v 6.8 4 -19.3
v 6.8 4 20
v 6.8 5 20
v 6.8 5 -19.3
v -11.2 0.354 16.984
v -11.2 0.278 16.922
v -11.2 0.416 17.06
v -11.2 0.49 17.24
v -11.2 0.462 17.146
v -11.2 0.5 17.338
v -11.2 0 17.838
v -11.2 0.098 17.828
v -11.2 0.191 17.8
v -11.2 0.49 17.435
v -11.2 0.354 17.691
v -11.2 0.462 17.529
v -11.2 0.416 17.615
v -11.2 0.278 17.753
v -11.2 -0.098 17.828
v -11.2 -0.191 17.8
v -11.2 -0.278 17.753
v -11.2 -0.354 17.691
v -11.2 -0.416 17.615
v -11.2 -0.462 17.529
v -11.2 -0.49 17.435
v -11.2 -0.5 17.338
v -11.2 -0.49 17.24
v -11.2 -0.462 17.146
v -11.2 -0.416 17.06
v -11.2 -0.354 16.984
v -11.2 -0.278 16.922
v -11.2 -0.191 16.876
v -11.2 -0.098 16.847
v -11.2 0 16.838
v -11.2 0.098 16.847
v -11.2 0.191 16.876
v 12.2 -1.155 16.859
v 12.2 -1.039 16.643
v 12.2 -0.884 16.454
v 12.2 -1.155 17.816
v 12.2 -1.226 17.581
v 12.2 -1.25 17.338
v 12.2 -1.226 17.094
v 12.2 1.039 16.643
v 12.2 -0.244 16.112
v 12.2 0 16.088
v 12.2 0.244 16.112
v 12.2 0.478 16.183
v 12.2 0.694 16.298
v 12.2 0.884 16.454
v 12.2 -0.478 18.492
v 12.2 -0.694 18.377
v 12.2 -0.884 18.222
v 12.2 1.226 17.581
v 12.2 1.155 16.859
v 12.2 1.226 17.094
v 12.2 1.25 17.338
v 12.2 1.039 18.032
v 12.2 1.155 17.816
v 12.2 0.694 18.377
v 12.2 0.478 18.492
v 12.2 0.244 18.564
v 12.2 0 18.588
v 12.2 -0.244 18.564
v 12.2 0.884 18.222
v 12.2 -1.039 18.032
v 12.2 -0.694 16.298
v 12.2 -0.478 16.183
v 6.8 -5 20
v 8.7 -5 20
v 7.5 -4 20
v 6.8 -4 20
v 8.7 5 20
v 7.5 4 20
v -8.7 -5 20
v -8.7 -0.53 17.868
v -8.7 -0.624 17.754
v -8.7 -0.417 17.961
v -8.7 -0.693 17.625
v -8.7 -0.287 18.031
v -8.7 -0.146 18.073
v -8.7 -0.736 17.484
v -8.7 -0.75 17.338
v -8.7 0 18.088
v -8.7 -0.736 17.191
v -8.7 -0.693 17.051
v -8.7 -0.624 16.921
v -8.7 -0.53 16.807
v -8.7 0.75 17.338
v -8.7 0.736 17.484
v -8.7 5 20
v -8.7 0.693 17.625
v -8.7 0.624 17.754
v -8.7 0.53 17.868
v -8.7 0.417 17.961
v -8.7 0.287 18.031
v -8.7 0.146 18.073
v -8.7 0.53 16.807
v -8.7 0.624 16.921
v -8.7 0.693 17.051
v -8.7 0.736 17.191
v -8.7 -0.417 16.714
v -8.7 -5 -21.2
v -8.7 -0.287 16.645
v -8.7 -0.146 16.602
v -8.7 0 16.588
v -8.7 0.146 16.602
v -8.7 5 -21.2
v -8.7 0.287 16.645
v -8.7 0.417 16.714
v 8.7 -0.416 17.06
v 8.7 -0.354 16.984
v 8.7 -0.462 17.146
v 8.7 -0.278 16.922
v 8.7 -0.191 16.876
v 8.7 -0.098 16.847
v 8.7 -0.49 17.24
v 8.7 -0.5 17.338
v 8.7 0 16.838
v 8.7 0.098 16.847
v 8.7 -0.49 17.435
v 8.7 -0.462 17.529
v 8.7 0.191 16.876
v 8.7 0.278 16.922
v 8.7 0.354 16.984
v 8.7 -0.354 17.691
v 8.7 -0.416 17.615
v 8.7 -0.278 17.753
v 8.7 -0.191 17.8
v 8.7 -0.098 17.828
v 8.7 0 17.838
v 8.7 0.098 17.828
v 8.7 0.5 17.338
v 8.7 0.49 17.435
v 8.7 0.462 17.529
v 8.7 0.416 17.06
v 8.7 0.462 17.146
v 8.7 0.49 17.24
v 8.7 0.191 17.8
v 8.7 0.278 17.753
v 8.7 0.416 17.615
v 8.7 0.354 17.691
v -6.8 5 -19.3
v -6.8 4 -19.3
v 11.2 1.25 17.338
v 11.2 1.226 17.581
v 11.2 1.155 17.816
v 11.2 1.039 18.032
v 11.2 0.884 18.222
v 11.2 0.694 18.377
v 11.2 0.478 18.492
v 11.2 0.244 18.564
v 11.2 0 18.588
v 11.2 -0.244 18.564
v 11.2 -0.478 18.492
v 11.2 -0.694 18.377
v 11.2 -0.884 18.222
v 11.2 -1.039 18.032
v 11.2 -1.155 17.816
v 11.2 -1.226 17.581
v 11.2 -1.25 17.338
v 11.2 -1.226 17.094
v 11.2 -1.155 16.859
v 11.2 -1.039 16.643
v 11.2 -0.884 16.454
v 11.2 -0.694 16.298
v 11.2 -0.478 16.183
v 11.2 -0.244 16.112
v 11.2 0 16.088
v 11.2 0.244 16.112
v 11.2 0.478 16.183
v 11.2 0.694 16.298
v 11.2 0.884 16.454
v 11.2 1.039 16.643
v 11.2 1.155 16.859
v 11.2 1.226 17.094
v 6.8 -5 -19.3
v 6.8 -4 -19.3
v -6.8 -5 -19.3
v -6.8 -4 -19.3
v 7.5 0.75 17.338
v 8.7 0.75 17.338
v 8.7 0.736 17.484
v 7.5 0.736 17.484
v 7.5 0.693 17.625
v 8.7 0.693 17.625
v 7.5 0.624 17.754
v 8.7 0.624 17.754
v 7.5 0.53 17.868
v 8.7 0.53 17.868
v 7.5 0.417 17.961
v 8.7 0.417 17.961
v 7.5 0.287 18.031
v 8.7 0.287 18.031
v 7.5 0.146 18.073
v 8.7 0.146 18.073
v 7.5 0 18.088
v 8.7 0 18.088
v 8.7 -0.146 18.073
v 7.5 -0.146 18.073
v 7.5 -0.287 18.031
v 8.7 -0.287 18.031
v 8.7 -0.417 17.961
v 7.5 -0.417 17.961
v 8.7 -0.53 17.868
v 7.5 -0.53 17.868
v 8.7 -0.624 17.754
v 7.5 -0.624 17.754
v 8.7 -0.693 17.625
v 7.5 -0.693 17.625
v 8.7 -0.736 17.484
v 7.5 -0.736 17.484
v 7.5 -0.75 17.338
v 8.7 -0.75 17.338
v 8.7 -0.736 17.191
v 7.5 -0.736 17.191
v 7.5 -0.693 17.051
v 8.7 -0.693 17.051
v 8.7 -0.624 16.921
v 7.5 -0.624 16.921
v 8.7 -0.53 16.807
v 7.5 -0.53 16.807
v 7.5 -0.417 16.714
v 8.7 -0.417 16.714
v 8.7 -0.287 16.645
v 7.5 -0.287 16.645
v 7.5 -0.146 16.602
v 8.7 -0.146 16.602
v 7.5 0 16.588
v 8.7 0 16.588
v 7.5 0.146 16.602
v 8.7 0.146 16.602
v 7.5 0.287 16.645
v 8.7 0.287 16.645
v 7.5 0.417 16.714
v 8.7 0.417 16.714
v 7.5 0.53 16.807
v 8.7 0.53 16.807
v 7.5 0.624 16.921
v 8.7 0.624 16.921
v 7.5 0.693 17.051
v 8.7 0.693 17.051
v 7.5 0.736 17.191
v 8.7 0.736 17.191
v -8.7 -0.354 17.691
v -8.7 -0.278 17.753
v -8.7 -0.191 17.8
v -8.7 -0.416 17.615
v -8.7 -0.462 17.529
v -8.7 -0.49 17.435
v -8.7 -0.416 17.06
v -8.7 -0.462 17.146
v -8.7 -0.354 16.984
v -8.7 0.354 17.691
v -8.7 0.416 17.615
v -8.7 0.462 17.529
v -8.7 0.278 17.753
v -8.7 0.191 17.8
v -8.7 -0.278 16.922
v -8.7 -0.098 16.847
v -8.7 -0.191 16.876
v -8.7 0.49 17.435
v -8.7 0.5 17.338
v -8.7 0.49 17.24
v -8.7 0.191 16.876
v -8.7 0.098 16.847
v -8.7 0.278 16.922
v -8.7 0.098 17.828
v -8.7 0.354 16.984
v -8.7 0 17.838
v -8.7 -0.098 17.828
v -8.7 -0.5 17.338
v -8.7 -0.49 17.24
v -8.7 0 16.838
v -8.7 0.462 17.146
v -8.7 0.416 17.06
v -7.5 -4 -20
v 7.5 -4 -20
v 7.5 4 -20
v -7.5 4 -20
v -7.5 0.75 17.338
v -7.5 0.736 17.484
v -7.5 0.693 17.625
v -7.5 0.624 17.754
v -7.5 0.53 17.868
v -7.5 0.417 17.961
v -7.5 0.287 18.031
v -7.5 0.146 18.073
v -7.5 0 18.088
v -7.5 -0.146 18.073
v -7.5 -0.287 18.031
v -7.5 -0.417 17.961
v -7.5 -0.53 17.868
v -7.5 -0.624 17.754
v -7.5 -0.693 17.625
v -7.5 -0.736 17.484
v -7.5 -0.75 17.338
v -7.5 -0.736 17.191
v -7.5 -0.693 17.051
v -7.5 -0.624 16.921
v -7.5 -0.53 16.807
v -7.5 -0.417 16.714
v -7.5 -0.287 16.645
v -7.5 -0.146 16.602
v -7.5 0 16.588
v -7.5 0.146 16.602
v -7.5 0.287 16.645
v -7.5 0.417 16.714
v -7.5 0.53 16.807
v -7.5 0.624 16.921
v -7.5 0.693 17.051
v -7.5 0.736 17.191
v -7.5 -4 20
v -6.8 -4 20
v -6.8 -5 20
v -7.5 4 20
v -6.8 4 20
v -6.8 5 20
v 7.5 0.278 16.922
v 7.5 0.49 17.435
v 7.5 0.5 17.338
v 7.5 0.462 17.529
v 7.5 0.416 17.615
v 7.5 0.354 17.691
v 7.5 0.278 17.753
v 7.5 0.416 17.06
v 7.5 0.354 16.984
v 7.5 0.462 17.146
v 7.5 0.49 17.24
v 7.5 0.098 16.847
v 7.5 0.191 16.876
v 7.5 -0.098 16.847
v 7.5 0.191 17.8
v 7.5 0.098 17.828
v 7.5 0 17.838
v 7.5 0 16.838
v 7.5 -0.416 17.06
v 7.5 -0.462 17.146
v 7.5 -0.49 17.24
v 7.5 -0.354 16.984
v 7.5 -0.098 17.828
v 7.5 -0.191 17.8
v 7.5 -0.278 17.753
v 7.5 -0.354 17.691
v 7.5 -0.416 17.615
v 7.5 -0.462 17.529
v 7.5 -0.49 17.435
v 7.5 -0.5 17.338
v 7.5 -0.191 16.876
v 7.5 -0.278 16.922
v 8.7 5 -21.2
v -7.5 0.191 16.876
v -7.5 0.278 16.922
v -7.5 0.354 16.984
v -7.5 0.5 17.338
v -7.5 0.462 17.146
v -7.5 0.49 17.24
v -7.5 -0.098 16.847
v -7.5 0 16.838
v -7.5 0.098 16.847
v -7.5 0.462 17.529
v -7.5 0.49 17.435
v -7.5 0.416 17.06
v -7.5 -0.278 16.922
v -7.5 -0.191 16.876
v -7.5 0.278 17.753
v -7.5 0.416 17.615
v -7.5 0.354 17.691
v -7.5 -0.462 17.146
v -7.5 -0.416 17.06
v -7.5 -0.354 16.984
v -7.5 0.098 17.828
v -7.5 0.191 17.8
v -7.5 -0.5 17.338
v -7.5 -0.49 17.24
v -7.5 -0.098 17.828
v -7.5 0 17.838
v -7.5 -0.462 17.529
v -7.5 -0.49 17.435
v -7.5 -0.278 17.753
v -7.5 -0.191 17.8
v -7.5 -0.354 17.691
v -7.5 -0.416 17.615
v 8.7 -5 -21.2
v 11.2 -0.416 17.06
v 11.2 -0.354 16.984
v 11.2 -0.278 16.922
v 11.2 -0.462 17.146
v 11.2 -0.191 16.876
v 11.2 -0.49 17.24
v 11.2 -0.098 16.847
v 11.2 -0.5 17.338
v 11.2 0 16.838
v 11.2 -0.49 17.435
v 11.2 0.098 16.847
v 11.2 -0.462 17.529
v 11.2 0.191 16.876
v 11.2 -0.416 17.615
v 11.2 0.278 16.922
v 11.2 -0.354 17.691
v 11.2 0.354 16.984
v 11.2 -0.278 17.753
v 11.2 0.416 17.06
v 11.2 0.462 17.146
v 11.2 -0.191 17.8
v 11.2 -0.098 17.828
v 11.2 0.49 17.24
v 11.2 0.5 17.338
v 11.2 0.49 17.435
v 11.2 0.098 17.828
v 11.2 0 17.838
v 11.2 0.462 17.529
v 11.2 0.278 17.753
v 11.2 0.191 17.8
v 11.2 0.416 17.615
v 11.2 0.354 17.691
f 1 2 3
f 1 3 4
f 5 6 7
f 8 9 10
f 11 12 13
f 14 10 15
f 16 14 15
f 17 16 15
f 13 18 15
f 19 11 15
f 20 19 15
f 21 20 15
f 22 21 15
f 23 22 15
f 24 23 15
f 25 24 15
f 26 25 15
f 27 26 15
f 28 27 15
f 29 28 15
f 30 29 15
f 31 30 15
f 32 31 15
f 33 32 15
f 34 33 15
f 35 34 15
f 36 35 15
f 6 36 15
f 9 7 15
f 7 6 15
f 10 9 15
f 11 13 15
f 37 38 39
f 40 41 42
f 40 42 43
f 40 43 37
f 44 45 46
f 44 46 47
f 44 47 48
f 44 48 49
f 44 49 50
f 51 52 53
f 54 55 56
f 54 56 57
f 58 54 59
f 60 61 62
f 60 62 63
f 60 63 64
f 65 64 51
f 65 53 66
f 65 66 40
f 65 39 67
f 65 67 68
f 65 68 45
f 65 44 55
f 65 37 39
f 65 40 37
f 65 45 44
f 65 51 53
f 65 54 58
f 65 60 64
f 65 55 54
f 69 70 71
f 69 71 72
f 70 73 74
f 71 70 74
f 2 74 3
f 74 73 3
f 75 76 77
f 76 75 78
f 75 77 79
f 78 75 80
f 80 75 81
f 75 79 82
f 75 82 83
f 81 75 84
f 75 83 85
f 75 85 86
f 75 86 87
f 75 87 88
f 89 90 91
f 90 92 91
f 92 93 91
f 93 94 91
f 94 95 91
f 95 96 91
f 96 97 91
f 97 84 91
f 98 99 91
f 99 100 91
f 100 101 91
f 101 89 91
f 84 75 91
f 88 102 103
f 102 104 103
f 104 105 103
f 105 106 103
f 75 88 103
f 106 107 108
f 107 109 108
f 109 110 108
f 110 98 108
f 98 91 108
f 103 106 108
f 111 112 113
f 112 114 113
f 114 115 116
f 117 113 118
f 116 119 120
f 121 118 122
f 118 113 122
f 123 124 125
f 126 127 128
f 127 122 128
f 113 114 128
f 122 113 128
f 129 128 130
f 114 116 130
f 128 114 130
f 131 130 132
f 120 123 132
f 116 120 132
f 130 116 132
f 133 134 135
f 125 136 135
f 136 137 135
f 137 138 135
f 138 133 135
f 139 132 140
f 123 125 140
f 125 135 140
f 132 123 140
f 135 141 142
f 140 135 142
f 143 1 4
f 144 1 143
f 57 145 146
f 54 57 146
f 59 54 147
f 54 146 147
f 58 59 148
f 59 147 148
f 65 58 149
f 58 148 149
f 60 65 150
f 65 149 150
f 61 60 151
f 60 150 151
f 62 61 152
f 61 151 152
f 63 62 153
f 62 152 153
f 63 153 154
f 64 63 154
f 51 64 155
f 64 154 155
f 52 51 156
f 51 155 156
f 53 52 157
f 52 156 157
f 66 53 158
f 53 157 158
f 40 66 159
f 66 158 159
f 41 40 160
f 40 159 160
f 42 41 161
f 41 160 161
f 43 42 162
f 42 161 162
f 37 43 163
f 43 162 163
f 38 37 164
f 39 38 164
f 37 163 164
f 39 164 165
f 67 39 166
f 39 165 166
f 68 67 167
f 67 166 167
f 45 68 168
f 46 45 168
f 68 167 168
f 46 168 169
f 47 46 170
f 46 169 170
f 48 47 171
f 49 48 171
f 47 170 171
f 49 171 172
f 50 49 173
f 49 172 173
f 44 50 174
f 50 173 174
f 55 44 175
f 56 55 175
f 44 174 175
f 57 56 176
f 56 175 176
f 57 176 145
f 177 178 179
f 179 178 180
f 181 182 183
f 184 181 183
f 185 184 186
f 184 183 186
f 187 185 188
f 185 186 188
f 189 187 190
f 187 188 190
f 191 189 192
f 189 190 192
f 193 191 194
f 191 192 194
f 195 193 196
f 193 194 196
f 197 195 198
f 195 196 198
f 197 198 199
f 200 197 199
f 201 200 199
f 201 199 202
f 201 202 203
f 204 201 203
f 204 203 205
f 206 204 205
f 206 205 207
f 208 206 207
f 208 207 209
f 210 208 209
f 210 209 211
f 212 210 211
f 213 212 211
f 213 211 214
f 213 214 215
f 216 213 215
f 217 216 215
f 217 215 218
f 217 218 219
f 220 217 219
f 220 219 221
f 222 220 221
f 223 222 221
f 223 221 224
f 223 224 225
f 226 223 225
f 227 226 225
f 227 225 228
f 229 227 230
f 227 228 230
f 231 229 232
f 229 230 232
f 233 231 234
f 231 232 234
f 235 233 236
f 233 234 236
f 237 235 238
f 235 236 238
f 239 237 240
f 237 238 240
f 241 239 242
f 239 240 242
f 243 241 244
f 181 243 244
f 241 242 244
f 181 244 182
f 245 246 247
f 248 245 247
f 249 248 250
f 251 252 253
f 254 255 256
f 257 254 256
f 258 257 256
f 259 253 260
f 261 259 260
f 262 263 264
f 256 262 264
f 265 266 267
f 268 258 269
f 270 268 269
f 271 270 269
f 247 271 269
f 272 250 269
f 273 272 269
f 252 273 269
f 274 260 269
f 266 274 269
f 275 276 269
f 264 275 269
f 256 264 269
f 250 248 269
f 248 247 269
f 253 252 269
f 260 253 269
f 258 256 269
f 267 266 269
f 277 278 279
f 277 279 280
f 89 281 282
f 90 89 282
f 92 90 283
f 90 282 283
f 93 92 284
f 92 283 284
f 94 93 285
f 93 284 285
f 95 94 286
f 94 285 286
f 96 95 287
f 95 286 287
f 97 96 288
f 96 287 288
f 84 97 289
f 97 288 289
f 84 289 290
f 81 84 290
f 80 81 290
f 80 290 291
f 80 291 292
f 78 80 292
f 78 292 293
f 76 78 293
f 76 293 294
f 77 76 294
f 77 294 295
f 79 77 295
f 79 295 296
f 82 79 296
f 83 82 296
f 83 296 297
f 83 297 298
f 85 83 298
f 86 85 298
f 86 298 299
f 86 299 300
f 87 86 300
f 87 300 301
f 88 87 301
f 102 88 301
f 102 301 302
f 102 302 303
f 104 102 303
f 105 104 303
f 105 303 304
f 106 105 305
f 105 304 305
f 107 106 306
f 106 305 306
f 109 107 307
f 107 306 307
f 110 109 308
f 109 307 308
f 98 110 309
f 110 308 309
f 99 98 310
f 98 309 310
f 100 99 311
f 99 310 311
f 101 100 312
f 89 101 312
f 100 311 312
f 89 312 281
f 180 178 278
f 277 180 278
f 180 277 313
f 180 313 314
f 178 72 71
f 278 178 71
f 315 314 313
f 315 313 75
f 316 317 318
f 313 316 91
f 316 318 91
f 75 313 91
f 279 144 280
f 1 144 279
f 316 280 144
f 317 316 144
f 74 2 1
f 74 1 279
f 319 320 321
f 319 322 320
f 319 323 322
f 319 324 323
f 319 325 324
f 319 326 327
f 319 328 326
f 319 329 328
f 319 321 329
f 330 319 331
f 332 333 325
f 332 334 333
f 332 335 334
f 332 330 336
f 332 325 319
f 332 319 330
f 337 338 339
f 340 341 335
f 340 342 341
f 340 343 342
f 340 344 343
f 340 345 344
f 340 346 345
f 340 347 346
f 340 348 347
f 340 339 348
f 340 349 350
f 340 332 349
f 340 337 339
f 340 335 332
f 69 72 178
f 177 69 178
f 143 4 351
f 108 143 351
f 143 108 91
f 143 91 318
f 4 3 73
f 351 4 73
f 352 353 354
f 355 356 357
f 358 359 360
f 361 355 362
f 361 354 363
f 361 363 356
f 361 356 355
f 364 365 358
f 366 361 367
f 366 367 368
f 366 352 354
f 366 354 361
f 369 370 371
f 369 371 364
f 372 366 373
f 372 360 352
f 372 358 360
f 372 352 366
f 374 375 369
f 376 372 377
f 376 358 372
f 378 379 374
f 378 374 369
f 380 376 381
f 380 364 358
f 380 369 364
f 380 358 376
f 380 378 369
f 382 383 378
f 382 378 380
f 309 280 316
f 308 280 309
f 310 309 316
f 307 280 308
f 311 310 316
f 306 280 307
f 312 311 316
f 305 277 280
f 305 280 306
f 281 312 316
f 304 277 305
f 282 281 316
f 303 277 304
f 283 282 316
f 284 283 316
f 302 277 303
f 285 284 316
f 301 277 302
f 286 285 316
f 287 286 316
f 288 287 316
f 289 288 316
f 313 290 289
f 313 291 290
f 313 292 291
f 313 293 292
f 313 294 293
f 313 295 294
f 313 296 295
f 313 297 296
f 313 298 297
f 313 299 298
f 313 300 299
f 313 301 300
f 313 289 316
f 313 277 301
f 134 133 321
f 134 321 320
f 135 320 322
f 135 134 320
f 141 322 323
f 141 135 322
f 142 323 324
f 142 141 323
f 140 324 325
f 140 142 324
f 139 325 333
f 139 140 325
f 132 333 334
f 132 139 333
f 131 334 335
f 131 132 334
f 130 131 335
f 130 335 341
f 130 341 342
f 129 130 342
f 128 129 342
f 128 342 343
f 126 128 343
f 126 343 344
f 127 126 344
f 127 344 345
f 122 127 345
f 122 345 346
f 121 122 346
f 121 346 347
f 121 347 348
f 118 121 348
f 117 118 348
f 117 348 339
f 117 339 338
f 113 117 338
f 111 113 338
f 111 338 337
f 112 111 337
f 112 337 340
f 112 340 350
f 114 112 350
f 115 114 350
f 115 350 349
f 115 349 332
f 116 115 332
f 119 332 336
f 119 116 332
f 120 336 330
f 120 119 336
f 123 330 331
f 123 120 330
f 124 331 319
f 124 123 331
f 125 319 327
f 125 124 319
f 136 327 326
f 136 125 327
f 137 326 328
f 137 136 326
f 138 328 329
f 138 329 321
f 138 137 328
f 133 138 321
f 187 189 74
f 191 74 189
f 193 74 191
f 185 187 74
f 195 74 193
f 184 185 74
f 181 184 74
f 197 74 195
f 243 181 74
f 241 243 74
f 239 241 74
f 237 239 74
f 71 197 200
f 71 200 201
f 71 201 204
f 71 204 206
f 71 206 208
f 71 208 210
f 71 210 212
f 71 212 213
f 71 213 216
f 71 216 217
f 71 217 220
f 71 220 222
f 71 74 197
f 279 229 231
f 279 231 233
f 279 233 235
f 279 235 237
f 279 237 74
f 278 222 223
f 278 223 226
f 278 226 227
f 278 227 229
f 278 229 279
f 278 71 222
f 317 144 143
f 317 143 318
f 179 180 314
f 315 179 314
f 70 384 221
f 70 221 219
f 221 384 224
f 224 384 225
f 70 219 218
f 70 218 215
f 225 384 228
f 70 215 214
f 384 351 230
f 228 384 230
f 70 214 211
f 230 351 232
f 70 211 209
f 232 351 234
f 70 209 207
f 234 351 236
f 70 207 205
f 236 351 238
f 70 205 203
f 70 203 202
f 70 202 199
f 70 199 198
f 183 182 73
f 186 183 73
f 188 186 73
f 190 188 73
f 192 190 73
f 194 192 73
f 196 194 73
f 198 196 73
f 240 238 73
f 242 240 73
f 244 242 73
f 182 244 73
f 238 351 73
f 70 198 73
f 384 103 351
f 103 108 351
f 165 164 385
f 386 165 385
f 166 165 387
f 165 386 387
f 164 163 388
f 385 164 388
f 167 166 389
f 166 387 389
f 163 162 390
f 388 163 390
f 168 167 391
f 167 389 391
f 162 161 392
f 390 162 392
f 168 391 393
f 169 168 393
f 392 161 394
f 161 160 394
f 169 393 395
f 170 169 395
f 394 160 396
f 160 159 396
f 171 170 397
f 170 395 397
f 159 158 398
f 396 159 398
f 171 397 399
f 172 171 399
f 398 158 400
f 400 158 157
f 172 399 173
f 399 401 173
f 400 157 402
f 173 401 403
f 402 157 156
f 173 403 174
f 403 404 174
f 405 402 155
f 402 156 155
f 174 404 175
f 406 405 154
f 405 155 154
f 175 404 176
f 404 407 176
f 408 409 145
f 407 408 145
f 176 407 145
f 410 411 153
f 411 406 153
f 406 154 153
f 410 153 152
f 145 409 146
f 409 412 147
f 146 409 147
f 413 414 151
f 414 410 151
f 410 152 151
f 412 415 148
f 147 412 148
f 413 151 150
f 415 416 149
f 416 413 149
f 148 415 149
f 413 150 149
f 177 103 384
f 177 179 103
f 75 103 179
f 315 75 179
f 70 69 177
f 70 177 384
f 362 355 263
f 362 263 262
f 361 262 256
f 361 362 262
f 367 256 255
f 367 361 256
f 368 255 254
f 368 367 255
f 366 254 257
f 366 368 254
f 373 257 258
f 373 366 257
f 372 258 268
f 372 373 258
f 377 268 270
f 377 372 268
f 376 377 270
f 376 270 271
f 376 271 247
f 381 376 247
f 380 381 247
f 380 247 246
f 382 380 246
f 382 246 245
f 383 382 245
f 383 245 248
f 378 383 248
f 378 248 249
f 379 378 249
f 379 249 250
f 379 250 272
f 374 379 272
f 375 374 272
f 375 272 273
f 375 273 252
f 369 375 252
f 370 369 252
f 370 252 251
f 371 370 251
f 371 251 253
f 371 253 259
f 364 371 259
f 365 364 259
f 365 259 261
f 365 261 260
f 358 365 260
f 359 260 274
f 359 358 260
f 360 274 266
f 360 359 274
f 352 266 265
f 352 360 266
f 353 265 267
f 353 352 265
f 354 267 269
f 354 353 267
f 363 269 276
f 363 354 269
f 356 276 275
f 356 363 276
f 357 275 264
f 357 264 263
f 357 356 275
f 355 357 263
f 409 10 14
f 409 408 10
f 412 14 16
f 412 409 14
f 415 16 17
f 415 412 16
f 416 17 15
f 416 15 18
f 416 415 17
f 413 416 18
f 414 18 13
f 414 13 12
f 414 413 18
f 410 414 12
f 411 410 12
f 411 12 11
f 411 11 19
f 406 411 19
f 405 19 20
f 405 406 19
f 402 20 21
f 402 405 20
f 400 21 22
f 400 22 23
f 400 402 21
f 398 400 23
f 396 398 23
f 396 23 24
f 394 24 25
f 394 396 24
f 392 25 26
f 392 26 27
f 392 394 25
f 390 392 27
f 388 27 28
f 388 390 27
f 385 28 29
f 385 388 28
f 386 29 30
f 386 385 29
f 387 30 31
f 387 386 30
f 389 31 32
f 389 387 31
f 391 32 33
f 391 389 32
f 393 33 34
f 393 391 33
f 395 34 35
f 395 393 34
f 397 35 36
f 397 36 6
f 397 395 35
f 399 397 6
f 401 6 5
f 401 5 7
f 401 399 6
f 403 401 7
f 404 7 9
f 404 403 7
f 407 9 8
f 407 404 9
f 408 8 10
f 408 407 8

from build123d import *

# Parameters (mm, degrees)
F1_DEPTH      = 4
F1_DEPTH_BACK = 4
F2_START      = -4
F2_DEPTH      = 1
F3_START      = 4
F3_DEPTH      = 1
F4_R          = 0.75
F4_R_2        = 0.5
F5_DEPTH      = 25
F6_DEPTH      = 2.5
F6_DEPTH_BACK = 19.9
F7_START      = 2.5
F4_R_3        = 1.25
F7_DEPTH      = 1


# Not quite as in the source:
# - a feature names something its author has since deleted; it is built from what else it names


with BuildPart() as f1:
    # F0 (on Front) → F1 (new body, two sides)
    with BuildSketch(Plane.XZ) as f1_sk:
        Polygon((7.5, 20), (7.5, -20), (-7.5, -20), (-7.5, 20), (-8.7, 20), (-8.7, -21.2), (8.7, -21.2), (8.7, 20), align=None)
    extrude(amount=F1_DEPTH)
    extrude(f1_sk.sketch, amount=-F1_DEPTH_BACK)

    # F0 (on Front) → F2 (join)
    with BuildSketch(Plane.XZ.offset(F2_START)):
        Polygon((-7.5, -20), (7.5, -20), (7.5, 20), (6.8, 20), (6.8, -19.3), (-6.8, -19.3), (-6.8, 20), (-7.5, 20), align=None)
        Polygon((7.5, 20), (7.5, -20), (-7.5, -20), (-7.5, 20), (-8.7, 20), (-8.7, -21.2), (8.7, -21.2), (8.7, 20), align=None)
    extrude(amount=-F2_DEPTH)

    # F0 (on Front) → F3 (join)
    with BuildSketch(Plane.XZ.offset(F3_START)):
        Polygon((7.5, 20), (7.5, -20), (-7.5, -20), (-7.5, 20), (-8.7, 20), (-8.7, -21.2), (8.7, -21.2), (8.7, 20), align=None)
        Polygon((-7.5, -20), (7.5, -20), (7.5, 20), (6.8, 20), (6.8, -19.3), (-6.8, -19.3), (-6.8, 20), (-7.5, 20), align=None)
    extrude(amount=F3_DEPTH)

    # F4 (on face) → F5 (cut)
    with BuildSketch(Plane.YZ.offset(8.7)):
        with Locations((0, 17.3376215611)):
            Circle(F4_R)
        with Locations((0, 17.3376215611)):
            Circle(F4_R_2, mode=Mode.SUBTRACT)
    extrude(amount=-F5_DEPTH, mode=Mode.SUBTRACT)


with BuildPart() as f6:
    # F4 (on face) → F6 (new body, two sides)
    with BuildSketch(Plane.YZ.offset(8.7)) as f6_sk:
        with Locations((0, 17.3376215611)):
            Circle(F4_R_2)
    extrude(amount=F6_DEPTH)
    extrude(f6_sk.sketch, amount=-F6_DEPTH_BACK)

    # F4 (on face) → F7 (join)
    with BuildSketch(Plane.YZ.offset(8.7).offset(F7_START)):
        with Locations((0, 17.3376215611)):
            Circle(F4_R_3)
        with Locations((0, 17.3376215611)):
            Circle(F4_R, mode=Mode.SUBTRACT)
        with Locations((0, 17.3376215611)):
            Circle(F4_R)
        with Locations((0, 17.3376215611)):
            Circle(F4_R_2, mode=Mode.SUBTRACT)
        with Locations((0, 17.3376215611)):
            Circle(F4_R_2)
    extrude(amount=F7_DEPTH)


solid = Compound([f1.part, f6.part])
